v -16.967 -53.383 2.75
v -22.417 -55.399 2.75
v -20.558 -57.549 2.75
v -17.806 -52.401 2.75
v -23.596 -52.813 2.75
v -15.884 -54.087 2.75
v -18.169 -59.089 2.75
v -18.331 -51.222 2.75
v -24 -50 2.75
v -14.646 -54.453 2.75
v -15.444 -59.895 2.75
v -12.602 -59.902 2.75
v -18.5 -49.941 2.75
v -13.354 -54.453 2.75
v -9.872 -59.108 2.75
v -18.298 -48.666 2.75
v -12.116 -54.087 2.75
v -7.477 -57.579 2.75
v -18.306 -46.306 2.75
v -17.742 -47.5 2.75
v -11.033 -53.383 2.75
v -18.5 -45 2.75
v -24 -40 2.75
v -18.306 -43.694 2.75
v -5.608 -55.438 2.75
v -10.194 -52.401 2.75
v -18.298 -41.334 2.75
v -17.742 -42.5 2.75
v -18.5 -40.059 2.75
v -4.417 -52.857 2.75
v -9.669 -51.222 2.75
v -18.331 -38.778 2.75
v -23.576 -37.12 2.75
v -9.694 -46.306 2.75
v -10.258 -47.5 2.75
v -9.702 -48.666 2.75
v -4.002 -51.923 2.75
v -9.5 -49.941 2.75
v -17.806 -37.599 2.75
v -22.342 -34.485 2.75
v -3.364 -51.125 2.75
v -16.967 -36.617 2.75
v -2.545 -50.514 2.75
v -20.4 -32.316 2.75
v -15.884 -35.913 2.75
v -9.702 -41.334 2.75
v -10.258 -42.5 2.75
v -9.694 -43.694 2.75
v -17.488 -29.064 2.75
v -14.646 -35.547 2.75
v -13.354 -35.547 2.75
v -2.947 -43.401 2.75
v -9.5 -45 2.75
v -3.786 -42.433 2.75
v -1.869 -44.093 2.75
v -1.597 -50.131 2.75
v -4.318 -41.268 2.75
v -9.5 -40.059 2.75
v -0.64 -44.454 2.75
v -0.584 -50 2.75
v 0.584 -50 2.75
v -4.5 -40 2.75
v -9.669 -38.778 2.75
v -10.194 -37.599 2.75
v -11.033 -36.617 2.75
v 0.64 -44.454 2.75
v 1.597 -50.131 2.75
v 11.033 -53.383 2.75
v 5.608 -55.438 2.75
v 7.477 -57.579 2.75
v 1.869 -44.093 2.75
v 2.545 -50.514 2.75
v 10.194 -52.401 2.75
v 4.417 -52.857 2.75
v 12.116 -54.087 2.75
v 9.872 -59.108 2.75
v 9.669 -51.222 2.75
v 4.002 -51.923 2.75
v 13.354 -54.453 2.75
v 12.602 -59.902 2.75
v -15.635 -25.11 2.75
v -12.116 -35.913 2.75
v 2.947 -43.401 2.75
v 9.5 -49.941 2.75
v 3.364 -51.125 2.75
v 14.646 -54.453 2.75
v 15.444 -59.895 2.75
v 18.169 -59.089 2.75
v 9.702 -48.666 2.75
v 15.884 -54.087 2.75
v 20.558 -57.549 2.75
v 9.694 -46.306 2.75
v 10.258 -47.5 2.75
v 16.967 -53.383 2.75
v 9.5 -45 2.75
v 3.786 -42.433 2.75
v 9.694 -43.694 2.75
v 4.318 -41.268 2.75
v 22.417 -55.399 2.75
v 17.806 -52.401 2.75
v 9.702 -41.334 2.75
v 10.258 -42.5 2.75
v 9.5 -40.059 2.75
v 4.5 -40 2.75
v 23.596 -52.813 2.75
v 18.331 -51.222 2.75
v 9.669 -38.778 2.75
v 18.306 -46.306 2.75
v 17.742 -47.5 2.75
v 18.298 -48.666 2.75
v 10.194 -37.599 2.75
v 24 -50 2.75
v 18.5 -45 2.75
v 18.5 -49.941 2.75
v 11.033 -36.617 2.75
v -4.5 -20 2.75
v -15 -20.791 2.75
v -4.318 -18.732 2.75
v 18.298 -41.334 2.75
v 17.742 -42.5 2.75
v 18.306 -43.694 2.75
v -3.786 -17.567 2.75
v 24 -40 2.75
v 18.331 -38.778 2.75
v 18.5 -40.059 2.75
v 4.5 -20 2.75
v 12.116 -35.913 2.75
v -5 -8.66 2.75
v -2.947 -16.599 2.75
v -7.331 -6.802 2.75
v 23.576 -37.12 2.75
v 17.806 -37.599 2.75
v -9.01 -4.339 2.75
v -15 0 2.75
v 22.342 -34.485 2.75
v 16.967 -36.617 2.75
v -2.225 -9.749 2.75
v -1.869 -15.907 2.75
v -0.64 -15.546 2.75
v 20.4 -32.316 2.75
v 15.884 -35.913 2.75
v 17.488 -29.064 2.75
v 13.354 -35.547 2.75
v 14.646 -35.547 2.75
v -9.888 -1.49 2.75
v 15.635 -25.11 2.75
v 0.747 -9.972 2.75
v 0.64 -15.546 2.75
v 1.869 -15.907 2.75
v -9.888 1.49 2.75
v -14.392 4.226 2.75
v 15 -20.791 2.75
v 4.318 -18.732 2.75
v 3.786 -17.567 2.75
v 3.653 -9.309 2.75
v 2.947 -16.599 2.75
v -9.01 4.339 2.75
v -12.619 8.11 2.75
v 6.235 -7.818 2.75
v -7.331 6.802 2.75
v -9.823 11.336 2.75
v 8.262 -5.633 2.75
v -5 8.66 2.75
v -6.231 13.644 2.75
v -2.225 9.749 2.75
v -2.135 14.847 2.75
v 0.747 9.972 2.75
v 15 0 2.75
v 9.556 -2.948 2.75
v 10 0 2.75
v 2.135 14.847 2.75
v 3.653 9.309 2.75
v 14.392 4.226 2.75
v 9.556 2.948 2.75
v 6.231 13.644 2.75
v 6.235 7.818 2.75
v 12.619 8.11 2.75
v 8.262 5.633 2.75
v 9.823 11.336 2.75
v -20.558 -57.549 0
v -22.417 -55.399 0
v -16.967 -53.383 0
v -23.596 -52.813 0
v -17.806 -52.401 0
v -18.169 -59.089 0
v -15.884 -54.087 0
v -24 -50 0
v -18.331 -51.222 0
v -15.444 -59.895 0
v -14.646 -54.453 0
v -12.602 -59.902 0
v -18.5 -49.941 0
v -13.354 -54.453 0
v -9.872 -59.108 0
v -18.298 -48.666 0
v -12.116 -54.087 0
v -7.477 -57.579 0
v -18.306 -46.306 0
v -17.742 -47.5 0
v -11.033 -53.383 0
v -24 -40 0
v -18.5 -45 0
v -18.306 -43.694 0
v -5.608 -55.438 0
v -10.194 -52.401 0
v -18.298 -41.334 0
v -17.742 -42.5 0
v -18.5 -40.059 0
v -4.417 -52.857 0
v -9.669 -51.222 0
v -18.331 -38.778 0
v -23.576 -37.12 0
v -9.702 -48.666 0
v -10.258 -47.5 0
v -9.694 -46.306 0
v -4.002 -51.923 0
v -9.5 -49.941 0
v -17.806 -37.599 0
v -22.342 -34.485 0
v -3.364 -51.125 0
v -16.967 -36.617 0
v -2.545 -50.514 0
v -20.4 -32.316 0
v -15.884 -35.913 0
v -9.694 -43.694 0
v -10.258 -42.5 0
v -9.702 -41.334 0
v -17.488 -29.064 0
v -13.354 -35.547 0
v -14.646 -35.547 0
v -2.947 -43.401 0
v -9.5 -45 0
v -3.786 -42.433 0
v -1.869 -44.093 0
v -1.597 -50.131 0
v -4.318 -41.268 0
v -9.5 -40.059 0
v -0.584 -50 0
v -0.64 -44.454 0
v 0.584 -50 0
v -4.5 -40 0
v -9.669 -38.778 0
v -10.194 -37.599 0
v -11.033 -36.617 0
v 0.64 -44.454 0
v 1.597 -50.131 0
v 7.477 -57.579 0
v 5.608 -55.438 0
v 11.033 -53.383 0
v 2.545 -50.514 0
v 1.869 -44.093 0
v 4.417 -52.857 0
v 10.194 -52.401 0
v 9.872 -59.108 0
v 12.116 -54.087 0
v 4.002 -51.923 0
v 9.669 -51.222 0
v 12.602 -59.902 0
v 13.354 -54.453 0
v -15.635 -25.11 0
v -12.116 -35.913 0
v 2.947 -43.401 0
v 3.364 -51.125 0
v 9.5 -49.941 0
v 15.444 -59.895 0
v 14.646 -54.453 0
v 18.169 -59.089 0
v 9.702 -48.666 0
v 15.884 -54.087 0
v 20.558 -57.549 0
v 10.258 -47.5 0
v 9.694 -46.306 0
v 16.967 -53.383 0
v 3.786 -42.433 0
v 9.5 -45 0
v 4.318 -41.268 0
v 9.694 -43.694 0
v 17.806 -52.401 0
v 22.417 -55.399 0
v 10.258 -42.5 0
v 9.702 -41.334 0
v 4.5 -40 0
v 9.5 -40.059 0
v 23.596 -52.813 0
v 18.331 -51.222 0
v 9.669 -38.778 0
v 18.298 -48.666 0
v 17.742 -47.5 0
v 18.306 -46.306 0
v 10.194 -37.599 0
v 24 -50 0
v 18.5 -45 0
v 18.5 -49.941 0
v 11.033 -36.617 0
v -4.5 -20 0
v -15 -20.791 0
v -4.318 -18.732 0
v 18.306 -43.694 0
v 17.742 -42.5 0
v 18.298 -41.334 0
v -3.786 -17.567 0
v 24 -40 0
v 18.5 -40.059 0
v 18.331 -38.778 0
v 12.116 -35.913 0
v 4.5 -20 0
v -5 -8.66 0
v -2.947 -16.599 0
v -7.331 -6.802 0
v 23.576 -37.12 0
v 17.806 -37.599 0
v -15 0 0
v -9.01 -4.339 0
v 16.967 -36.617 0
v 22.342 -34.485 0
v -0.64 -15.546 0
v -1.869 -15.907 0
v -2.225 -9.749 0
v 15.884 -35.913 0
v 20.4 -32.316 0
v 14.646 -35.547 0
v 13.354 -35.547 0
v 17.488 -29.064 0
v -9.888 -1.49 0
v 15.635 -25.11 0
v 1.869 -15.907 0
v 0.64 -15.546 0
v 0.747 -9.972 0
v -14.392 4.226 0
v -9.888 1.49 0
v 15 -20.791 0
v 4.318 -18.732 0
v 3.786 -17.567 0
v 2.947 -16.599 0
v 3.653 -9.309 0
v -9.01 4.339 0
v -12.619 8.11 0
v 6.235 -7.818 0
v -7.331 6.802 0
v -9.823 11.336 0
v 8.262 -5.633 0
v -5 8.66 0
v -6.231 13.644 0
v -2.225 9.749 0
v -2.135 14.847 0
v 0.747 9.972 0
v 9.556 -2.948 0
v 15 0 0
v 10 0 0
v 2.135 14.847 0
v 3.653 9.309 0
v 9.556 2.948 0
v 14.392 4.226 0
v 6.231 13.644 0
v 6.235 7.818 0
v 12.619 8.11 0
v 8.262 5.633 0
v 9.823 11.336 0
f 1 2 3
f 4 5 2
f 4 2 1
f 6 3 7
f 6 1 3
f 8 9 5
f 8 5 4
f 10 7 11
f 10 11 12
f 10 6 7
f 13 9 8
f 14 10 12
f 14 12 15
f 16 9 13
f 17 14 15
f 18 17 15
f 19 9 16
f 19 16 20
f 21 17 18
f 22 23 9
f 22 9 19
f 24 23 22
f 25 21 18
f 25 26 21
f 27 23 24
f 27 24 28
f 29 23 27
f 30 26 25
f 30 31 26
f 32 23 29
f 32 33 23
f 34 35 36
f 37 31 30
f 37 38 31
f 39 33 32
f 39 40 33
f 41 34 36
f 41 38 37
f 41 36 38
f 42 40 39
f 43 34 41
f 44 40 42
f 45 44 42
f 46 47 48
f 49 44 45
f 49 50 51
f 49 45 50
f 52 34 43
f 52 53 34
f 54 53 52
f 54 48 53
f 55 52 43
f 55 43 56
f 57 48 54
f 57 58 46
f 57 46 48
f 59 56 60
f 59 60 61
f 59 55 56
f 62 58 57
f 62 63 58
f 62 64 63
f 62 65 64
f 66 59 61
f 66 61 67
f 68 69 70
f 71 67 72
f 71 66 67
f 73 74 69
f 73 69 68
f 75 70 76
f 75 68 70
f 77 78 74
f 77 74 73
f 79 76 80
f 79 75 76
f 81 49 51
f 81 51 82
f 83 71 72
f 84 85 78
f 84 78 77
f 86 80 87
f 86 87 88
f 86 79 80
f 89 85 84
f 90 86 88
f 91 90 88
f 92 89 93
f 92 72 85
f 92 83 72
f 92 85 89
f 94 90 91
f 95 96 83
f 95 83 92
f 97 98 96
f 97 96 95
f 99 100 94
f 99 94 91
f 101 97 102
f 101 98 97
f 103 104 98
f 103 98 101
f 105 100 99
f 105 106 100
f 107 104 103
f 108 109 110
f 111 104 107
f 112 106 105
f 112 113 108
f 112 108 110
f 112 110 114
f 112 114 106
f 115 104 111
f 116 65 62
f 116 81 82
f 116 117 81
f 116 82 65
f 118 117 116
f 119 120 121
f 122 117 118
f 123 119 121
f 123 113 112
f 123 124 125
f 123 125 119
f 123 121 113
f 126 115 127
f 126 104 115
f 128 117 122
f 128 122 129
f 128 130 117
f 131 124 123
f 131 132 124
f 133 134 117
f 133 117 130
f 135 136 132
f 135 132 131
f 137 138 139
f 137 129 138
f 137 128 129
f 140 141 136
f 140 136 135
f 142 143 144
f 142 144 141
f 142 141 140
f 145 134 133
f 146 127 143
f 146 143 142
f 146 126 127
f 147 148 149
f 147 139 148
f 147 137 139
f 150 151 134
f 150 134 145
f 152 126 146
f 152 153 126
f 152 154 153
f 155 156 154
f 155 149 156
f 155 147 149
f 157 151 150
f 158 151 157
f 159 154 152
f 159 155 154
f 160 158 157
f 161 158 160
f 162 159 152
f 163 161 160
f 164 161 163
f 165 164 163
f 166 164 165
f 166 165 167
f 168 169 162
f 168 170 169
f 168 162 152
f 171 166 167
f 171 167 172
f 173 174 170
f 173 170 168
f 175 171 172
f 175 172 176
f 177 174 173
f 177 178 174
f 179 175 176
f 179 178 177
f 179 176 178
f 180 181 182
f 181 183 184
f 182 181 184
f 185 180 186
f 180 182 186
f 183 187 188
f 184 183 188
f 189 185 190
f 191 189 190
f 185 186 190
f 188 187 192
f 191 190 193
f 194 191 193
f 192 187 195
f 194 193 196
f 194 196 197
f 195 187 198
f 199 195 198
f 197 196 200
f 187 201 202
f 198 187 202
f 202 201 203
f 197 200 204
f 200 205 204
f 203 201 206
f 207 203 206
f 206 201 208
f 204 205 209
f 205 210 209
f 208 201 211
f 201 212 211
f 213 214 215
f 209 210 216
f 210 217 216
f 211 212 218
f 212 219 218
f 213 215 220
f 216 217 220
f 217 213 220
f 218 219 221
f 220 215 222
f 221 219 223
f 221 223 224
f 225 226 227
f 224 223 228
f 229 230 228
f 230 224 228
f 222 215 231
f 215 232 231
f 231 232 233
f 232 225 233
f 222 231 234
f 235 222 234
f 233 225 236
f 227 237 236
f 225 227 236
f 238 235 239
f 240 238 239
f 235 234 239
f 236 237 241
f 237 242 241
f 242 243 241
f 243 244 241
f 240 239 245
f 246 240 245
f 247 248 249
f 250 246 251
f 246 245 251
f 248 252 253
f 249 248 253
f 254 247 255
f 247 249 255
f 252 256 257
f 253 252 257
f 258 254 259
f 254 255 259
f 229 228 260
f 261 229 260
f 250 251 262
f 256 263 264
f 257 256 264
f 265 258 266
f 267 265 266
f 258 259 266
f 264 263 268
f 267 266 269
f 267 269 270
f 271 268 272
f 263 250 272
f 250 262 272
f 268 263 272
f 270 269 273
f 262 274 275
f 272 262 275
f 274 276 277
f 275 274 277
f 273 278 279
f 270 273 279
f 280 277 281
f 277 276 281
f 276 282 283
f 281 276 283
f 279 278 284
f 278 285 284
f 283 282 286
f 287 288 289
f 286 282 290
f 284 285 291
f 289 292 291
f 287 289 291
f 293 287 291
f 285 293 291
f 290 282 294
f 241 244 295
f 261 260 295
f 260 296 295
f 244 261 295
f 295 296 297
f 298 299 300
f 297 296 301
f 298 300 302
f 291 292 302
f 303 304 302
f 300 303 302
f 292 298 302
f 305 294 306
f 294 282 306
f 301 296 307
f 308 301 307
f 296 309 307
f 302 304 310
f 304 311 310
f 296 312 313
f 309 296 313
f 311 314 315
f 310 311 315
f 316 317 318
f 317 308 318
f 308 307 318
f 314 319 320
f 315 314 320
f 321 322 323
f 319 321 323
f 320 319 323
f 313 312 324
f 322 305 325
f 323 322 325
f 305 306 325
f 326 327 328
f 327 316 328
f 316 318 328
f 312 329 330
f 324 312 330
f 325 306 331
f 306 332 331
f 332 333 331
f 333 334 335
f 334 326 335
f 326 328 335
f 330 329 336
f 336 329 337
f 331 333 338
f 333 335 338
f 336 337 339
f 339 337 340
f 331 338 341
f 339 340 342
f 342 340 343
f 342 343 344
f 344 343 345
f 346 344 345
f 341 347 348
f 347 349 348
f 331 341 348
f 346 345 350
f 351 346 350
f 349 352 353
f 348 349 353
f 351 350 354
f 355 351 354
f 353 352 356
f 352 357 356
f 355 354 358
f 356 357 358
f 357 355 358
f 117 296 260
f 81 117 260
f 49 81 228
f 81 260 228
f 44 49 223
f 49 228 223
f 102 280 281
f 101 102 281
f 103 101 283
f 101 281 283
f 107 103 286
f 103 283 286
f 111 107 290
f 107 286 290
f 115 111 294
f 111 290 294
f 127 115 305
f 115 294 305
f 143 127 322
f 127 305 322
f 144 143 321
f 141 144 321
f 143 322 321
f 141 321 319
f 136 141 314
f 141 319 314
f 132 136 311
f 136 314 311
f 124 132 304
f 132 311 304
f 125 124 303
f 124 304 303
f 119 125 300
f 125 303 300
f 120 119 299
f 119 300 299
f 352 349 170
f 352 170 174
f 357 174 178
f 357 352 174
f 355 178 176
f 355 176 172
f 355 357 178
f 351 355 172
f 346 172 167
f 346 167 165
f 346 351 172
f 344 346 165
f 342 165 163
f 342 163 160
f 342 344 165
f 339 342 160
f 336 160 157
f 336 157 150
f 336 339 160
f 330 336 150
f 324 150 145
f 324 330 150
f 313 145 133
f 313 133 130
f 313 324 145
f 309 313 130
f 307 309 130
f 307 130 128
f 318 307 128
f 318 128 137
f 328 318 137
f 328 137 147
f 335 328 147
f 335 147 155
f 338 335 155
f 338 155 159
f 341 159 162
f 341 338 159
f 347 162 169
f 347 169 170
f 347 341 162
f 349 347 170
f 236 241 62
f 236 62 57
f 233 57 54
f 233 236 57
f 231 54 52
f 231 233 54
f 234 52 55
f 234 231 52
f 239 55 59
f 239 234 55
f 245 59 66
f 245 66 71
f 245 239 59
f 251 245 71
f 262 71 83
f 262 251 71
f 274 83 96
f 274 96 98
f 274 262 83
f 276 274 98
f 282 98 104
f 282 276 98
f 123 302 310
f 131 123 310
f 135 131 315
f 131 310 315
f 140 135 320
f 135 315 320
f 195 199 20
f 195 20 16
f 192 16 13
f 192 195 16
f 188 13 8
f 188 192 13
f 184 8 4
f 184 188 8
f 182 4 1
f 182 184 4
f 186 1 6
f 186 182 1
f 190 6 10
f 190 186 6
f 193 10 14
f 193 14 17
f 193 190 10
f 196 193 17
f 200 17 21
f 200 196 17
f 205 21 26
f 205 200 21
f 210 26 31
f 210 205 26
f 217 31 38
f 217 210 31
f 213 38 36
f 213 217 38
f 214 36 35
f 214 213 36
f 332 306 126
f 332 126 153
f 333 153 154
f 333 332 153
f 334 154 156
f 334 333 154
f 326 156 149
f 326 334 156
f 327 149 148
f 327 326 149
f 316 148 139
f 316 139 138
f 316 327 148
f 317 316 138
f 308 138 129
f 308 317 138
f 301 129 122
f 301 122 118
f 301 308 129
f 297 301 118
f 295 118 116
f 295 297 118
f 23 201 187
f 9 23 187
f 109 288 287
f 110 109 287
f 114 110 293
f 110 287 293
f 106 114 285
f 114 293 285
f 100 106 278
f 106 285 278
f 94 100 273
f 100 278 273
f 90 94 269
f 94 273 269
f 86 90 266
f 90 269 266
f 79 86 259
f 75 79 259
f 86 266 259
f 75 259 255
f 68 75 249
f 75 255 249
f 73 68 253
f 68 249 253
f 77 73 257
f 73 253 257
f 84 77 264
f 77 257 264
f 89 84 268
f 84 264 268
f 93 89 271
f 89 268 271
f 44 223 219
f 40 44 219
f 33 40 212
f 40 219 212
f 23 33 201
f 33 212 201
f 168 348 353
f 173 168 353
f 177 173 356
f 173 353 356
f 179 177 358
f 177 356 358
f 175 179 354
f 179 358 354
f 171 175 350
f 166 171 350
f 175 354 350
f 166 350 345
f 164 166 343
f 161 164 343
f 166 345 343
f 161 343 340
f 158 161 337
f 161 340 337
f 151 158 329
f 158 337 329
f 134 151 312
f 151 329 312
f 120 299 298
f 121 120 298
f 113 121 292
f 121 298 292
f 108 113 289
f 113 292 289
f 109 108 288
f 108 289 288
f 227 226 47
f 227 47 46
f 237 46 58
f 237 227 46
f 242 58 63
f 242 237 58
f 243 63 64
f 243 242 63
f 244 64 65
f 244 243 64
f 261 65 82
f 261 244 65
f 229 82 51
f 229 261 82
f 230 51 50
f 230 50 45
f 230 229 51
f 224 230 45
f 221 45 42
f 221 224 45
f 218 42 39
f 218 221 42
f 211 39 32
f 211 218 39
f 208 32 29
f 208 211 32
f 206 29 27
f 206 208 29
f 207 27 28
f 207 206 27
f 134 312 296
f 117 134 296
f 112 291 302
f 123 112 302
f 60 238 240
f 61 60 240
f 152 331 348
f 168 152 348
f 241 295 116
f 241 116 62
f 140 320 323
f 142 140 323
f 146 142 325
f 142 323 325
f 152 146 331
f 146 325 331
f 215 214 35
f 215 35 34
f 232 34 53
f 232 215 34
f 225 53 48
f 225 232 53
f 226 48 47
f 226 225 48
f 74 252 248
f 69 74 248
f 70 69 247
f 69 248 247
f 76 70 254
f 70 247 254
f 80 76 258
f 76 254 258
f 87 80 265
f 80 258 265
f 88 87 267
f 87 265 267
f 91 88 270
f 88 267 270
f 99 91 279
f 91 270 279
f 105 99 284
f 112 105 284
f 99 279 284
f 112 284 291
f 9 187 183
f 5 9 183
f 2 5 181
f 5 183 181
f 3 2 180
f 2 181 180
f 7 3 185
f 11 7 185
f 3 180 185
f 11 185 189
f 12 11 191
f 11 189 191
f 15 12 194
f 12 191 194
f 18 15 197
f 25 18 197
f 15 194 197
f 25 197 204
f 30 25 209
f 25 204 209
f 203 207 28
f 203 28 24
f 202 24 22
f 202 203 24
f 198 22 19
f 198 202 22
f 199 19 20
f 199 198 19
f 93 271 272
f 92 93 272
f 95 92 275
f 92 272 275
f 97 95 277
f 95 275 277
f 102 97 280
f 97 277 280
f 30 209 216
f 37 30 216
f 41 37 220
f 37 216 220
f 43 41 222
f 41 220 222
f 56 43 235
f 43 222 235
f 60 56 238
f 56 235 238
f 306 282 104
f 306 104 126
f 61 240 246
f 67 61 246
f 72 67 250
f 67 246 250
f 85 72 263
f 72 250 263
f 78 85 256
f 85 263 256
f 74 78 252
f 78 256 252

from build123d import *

# Parameters (mm, degrees)
SKETCH_1_R      = 10
EXTRUDE_1_DEPTH = 2.75


with BuildPart() as part:
    # 草图1 → 凸台-拉伸1 (new body)
    with BuildSketch(Plane.XY):
        with BuildLine():
            Line((-24, -40), (-24, -50))
            ThreePointArc((-24, -50), (-15.443695821, -59.895238369), (-4.416851525, -52.857142857))
            ThreePointArc((-4.416851525, -52.857142857), (-2.974049354, -50.792865097), (-0.583592135, -50))
            Line((-0.583592135, -50), (0.583592135, -50))
            ThreePointArc((0.583592135, -50), (2.974049354, -50.792865097), (4.416851525, -52.857142857))
            ThreePointArc((4.416851525, -52.857142857), (15.443695821, -59.895238369), (24, -50))
            Line((24, -50), (24, -40))
            ThreePointArc((24, -40), (23.055385138, -35.757359313), (20.4, -32.316250915))
            ThreePointArc((20.4, -32.316250915), (16.416922293, -27.154588318), (15, -20.790627288))
            Line((15, -20.790627288), (15, 0))
            ThreePointArc((15, 0), (0, 15), (-15, 0))
            Line((-15, 0), (-15, -20.790627288))
            ThreePointArc((-15, -20.790627288), (-16.416922293, -27.154588318), (-20.4, -32.316250915))
            ThreePointArc((-20.4, -32.316250915), (-23.055385138, -35.757359313), (-24, -40))
        make_face()
        Circle(SKETCH_1_R, mode=Mode.SUBTRACT)
        with BuildLine():
            Line((-4.5, -20), (-4.5, -40))
            ThreePointArc((-4.5, -40), (0, -44.5), (4.5, -40))
            Line((4.5, -40), (4.5, -20))
            ThreePointArc((4.5, -20), (0, -15.5), (-4.5, -20))
        make_face(mode=Mode.SUBTRACT)
        with BuildLine():
            ThreePointArc((-17.741657387, -47.5), (-14, -54.5), (-10.258342613, -47.5))
            ThreePointArc((-10.258342613, -47.5), (-9.5, -45), (-10.258342613, -42.5))
            ThreePointArc((-10.258342613, -42.5), (-14, -35.5), (-17.741657387, -42.5))
            ThreePointArc((-17.741657387, -42.5), (-18.5, -45), (-17.741657387, -47.5))
        make_face(mode=Mode.SUBTRACT)
        with BuildLine():
            ThreePointArc((10.258342613, -47.5), (9.5, -45), (10.258342613, -42.5))
            ThreePointArc((10.258342613, -42.5), (14, -35.5), (17.741657387, -42.5))
            ThreePointArc((17.741657387, -42.5), (18.5, -45), (17.741657387, -47.5))
            ThreePointArc((17.741657387, -47.5), (14, -54.5), (10.258342613, -47.5))
        make_face(mode=Mode.SUBTRACT)
    extrude(amount=EXTRUDE_1_DEPTH)


solid = part.part
